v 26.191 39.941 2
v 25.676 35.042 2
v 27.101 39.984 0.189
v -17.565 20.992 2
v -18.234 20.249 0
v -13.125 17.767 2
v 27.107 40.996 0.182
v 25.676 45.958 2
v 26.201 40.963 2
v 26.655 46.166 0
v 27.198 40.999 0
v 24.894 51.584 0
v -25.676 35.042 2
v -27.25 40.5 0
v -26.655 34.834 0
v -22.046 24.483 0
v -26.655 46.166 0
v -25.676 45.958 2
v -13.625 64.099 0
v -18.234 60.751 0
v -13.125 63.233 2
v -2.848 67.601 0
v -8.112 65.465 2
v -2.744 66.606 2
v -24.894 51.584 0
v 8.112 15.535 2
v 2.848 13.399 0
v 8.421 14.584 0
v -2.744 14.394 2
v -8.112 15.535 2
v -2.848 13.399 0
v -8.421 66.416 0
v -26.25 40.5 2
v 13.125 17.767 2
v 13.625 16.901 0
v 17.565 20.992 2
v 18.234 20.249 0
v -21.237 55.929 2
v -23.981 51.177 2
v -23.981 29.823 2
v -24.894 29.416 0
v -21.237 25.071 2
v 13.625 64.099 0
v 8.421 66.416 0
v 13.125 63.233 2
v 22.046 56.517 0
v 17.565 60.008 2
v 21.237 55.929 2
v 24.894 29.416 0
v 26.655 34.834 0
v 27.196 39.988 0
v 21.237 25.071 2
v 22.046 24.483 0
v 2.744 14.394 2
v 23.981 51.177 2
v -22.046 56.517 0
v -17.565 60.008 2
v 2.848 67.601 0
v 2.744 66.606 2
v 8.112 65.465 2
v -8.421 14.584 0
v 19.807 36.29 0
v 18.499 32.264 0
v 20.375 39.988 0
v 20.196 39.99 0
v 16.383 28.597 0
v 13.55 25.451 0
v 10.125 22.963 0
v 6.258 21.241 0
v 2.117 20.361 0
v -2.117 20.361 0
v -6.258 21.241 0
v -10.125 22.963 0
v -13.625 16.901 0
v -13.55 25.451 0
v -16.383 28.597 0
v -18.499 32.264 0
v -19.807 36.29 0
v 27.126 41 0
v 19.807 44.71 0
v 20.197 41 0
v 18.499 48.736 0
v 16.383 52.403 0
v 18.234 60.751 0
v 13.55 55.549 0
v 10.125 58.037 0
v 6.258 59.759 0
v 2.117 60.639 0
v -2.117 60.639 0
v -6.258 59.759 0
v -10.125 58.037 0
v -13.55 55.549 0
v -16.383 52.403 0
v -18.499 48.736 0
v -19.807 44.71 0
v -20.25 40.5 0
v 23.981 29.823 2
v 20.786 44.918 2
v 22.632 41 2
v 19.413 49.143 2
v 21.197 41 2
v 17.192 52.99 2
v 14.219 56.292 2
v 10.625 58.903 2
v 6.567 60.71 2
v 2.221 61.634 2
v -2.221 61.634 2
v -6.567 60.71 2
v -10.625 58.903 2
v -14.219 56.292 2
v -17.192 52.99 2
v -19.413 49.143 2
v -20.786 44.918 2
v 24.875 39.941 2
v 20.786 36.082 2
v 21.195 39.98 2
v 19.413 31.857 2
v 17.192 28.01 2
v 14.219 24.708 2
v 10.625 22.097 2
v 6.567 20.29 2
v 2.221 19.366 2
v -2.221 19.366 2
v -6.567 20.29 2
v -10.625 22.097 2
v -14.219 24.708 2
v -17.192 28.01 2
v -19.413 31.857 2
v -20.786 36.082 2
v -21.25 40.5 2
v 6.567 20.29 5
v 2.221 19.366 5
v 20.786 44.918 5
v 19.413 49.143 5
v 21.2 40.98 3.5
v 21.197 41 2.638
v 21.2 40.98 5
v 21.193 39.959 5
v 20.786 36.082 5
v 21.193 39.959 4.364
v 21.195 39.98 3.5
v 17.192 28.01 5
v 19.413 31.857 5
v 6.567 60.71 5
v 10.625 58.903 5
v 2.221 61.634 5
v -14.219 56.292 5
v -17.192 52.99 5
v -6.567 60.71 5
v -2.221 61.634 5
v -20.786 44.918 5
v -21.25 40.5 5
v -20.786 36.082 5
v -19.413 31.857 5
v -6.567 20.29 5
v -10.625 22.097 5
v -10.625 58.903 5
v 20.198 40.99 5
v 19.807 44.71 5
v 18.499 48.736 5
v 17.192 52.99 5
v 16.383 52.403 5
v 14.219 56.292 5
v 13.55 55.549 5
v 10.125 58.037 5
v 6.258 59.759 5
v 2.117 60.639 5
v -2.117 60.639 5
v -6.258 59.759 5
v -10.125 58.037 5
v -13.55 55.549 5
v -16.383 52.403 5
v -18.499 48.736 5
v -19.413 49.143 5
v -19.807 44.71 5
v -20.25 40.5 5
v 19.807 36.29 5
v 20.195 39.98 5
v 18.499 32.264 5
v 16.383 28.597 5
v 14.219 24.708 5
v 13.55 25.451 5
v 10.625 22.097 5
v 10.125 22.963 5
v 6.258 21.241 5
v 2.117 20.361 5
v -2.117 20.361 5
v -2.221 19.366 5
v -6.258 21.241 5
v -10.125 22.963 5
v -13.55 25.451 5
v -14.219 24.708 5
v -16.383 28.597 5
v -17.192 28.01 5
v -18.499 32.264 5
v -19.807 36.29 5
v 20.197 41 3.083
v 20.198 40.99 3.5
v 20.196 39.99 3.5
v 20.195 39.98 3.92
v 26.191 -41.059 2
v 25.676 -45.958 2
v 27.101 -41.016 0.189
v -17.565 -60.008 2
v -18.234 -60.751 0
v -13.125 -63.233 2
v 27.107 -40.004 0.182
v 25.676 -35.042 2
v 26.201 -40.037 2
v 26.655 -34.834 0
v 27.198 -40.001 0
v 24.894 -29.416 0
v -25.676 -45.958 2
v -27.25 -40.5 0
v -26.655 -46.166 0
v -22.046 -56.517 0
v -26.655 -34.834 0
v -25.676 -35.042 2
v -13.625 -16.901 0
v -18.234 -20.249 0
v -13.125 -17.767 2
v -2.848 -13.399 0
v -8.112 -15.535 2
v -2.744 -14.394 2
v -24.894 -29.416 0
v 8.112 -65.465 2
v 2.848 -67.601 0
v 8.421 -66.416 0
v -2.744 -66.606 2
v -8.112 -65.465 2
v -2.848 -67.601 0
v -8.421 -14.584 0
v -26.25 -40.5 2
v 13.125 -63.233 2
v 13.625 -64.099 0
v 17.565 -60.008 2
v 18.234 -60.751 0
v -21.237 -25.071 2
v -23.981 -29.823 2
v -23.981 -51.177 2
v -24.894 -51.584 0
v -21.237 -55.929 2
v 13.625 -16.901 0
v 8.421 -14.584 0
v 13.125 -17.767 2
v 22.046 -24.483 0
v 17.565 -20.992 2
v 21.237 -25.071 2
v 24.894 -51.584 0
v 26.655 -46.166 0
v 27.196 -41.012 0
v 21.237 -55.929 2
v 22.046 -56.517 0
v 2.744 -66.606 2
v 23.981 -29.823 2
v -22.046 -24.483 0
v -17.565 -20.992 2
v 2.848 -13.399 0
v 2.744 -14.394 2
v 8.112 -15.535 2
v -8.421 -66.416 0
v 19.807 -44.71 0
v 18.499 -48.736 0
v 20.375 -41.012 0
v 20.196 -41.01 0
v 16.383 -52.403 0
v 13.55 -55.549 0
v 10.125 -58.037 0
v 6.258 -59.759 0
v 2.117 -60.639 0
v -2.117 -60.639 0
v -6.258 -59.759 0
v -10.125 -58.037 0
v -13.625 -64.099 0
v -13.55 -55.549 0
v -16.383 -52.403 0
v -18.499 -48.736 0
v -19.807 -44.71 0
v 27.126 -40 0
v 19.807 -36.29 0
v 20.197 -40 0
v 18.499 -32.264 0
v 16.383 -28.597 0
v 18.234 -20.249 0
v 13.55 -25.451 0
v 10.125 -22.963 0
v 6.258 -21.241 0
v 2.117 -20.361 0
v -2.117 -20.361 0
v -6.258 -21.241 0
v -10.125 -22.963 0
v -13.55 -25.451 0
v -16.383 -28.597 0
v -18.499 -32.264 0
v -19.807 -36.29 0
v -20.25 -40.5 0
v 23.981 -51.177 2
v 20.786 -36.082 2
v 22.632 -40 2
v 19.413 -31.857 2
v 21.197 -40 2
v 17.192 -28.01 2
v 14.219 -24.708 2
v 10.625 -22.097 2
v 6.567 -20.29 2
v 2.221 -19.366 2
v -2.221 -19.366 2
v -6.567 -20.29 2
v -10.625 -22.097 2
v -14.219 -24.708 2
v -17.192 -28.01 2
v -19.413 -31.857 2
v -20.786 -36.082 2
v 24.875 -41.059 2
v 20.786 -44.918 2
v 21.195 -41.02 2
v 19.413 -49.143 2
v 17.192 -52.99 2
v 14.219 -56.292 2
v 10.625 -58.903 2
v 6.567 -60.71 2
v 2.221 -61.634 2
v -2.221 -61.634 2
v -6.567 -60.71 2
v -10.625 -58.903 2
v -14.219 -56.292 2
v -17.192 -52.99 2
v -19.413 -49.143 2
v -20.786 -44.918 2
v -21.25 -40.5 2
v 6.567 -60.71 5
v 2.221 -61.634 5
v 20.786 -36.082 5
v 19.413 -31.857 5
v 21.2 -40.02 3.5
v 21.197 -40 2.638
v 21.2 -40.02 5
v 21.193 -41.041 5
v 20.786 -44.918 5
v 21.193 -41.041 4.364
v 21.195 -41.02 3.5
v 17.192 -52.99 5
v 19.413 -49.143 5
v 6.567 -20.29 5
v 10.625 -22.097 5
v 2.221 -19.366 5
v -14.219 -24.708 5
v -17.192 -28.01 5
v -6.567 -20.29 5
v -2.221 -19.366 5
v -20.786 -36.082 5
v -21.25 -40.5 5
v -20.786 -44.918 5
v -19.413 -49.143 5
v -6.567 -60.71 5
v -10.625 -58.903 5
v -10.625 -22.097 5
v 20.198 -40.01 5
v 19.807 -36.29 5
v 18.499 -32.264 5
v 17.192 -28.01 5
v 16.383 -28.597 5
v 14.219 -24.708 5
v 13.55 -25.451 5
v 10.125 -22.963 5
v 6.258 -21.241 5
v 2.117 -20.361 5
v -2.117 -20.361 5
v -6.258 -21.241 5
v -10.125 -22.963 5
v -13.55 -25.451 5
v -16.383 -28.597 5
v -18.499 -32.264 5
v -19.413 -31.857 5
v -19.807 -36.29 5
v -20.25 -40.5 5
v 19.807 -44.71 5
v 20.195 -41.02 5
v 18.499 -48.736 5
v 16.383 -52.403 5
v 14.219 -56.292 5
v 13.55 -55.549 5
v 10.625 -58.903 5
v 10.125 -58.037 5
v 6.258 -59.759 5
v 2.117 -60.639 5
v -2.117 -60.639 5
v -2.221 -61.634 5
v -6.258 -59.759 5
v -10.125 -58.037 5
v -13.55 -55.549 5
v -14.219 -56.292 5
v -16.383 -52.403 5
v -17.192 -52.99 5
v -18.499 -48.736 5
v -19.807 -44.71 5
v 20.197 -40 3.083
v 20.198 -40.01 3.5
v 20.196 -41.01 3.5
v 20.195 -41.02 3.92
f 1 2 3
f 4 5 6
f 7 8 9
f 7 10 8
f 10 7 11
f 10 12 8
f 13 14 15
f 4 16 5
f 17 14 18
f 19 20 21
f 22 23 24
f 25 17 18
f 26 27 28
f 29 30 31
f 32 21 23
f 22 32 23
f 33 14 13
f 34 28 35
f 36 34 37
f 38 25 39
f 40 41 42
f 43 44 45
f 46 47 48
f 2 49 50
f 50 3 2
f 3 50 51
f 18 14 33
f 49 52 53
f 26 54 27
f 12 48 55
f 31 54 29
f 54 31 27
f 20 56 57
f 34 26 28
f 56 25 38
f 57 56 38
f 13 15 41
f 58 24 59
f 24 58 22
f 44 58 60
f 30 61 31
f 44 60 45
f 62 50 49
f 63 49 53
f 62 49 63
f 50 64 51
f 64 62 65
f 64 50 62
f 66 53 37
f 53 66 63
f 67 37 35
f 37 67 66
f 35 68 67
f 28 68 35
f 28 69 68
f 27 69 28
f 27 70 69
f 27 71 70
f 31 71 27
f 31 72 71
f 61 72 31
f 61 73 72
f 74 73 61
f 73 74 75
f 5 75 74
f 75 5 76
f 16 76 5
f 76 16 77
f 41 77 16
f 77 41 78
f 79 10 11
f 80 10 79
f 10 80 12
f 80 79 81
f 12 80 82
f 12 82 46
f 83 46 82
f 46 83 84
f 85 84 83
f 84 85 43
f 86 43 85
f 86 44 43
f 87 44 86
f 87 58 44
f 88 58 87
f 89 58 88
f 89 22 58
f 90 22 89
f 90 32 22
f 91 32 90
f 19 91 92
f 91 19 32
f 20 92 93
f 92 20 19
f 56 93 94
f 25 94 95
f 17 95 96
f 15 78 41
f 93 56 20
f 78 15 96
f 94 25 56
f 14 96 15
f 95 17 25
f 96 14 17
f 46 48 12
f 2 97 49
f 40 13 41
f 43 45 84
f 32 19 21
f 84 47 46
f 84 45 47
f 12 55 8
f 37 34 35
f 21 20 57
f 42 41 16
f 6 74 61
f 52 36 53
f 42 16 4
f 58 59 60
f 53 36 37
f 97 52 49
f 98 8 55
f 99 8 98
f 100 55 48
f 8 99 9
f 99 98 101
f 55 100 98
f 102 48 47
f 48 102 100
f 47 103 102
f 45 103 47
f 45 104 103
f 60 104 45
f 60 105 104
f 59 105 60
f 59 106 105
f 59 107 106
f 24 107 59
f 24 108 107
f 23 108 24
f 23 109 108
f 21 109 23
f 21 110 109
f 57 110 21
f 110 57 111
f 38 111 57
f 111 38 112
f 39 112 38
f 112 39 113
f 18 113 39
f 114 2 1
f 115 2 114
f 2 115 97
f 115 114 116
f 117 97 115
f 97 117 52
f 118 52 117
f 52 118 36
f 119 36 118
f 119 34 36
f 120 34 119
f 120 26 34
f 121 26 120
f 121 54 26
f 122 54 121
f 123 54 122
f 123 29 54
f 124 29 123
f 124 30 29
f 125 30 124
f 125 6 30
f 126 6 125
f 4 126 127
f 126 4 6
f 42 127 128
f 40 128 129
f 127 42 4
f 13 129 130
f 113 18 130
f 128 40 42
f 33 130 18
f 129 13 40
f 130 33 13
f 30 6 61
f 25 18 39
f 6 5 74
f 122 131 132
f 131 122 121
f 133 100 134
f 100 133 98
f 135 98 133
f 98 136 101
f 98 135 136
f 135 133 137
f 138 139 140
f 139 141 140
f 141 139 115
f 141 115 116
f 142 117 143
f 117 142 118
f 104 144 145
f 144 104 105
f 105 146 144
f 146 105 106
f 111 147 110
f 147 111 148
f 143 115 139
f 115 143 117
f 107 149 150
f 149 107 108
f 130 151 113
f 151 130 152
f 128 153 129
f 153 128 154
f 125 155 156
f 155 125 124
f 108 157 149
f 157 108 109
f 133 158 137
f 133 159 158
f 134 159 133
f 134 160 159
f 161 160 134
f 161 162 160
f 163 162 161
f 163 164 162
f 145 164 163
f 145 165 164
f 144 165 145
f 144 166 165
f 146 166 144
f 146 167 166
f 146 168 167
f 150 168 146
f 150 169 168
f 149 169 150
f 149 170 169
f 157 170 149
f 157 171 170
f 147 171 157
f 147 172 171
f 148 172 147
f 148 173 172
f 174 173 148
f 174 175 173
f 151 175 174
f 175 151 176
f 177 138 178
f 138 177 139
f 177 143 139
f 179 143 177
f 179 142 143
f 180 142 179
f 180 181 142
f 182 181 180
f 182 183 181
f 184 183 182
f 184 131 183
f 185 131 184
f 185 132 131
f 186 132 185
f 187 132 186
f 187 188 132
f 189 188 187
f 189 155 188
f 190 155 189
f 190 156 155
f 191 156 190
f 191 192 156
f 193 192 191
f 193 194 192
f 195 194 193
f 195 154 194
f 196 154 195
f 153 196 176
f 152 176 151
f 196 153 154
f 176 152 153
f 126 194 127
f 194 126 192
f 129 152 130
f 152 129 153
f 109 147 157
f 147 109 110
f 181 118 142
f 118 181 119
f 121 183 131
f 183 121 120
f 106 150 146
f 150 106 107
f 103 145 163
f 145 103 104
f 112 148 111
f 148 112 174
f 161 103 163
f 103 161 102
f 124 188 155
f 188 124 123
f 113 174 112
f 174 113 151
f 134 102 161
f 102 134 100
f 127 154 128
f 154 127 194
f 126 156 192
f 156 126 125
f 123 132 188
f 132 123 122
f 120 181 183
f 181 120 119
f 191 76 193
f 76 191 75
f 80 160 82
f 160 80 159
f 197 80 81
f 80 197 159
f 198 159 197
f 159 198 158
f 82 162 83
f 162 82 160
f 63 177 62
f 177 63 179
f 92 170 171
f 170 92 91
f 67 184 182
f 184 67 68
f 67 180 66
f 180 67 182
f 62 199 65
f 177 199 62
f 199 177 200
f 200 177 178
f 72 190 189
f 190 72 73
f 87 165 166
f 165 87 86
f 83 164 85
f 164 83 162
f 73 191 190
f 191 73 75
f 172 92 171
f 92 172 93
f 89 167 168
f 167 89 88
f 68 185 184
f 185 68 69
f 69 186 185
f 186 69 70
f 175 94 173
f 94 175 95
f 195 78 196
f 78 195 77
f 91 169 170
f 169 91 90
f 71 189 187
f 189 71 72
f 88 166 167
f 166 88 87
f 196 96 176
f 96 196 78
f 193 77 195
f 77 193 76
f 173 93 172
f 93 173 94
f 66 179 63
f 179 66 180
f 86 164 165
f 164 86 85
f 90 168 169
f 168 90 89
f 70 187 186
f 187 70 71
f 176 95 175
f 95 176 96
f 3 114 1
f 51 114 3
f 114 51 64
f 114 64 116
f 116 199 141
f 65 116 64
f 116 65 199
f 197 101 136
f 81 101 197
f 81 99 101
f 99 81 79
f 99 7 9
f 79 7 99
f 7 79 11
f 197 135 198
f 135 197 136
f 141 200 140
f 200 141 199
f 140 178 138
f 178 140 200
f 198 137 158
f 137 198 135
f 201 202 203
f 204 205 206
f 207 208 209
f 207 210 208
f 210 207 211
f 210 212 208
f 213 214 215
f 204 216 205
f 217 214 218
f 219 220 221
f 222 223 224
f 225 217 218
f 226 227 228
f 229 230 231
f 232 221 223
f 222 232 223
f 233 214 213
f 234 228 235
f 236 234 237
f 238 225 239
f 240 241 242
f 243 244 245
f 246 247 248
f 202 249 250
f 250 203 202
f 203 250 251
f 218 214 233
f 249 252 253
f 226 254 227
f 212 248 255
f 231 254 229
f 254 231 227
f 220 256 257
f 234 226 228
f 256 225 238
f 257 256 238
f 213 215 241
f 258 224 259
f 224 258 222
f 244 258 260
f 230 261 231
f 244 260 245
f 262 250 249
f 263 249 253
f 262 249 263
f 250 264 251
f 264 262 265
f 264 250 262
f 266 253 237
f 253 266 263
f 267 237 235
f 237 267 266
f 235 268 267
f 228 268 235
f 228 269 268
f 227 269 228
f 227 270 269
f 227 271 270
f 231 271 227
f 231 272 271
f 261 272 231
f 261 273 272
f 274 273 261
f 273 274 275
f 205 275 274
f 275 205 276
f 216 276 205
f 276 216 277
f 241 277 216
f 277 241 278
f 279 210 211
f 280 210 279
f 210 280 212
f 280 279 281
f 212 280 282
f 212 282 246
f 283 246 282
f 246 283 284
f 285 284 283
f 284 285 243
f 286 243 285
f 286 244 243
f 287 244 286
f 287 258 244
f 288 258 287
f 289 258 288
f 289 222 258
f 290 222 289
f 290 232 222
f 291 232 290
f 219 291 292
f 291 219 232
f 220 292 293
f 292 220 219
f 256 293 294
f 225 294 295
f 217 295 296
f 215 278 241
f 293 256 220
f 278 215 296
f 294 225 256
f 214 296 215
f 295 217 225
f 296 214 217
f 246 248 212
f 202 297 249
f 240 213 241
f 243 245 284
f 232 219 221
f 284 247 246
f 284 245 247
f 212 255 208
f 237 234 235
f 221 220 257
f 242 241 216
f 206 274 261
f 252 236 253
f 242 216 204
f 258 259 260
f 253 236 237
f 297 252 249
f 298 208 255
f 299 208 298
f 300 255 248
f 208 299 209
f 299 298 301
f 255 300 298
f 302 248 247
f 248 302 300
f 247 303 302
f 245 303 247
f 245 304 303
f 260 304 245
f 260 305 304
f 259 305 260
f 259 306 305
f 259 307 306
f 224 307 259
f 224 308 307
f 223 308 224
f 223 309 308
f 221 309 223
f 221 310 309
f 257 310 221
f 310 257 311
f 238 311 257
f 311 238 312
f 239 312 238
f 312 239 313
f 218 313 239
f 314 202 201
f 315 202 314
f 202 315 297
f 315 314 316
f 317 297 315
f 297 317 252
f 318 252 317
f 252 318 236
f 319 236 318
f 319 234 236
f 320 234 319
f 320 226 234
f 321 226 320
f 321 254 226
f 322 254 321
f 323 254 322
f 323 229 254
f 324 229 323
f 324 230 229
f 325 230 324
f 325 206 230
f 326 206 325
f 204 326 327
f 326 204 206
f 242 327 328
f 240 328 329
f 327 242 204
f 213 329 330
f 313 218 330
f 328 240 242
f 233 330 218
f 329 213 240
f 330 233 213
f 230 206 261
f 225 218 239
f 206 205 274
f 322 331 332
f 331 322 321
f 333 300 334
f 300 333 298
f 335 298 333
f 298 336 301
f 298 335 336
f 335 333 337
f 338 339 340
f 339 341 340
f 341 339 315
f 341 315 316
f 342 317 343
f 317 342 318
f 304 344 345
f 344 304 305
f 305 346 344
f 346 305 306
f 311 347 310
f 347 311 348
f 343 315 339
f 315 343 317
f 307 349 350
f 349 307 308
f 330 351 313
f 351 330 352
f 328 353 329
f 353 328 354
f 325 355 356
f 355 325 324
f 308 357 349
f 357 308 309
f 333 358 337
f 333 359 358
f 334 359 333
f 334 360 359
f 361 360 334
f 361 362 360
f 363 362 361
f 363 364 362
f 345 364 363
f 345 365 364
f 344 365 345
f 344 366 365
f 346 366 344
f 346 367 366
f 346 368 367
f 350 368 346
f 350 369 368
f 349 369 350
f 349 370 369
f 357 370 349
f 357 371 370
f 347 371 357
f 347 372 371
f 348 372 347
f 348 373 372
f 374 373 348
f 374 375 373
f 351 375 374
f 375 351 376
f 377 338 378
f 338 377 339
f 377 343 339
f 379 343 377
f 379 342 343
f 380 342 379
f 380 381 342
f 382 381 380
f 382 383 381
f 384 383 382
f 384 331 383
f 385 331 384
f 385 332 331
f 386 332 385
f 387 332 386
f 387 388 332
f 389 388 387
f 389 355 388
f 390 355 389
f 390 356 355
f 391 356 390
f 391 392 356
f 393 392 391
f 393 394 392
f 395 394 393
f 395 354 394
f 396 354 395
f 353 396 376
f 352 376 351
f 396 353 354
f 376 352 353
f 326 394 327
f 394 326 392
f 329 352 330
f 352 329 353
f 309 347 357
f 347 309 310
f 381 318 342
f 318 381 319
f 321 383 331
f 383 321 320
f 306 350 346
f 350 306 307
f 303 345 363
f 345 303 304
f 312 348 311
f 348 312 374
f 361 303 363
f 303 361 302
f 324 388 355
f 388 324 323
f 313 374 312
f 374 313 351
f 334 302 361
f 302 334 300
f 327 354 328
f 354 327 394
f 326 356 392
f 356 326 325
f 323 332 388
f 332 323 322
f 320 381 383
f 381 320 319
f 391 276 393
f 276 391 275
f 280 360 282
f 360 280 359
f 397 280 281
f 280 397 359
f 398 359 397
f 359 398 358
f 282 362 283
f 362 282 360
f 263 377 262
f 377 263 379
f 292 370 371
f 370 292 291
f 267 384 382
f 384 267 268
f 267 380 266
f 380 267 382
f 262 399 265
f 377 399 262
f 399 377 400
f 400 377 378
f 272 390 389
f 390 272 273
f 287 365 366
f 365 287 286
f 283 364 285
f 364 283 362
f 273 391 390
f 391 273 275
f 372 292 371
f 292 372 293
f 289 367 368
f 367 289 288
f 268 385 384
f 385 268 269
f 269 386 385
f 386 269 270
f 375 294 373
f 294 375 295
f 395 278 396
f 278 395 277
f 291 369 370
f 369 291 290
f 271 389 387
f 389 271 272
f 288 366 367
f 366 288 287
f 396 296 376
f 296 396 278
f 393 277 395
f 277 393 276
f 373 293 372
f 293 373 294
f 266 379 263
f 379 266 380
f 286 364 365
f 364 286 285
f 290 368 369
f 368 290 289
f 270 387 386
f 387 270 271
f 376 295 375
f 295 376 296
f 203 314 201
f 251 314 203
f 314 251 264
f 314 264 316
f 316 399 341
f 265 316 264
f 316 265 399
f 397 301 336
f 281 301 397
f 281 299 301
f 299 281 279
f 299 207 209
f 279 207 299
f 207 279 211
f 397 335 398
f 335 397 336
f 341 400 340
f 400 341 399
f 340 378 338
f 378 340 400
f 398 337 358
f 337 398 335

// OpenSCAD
/* Copyright © 2016. Alexander Golikov.
 * 
 * This file is free software: you can redistribute it and/or modify it under the terms of the Creative Commons Attribution-NonCommercial-ShareAlike International Public License, either version 4.0 of the License, or (at your option) any later version.
 * 
 * This file is distributed in the hope that it will be useful, but WITHOUT ANY WARRANTY; without even the implied warranty of MERCHANTABILITY or FITNESS FOR A PARTICULAR PURPOSE. See the Creative Commons Attribution-NonCommercial-ShareAlike International Public License for more details.
 * 
 * You should have received a copy of the Creative Commons Attribution-NonCommercial-ShareAlike International Public License along with this file.
 * 
 * If not, see https://creativecommons.org/licenses/by-nc-sa/4.0/legalcode.
 */

// Diameter of rolling pin.
diameter = 40.5; 		// [30:0.5:70]
// Thickness of the rolled dough.
width = 7; 				// [1:1:10]
// Height of the extender.
height = 5; 			// [2:1:10]
// Number of the extenders
number = 2; 			// [1:One, 2:Two, 4:Four]
// Sharp facet. NOTE! Depends on opportunities of Your printer
facet = 1; 			// [1:On, 0:Off]
// Dual sharp facet, if "Sarp facet" is on.
second_facet = 0; 	// [1:On, 0:Off]
// Thickness of "Sarp facet". NOTE! May be NOT MORE then Height/2!
thickness = 1; 			// [1:0.5:5]

/* [Hidden] */

//$fn=64;
d=diameter;
w=width;
h=height;
th=thickness;

r1=(d/2+w);
r2=(d/2+(w-1));

if (th > (h/2)) {
	th = round(h/2);
}

if(number==4) {
	guide(d,d);
	guide(d,-d);
	guide(-d,d);
	guide(-d,-d);
} else if(number==2) {
	guide(0,d);
	guide(0,-d);
} else {
	guide(0,0);
}

module guide(x,y) {
	translate([x,y,0]){
		difference(){
			union(){
				color("green")
					if(facet==1){
						if(second_facet==1){
							union(){
								cylinder(h=th,r1=r2,r2=r1,center=false);
								translate([0,0,th]){
									cylinder(h=th,r1=r1,r2=r2,center=false);
								}
							}
						} else {
							cylinder(h=2*th,r1=r1,r2=r2,center=false);
						}
					} else {
						cylinder(h=h,r=r1,center=false);
					}
				color("red")
					cylinder(h=h,d=(d+(2*th)),center=false);
			}
			color("yellow")
				translate([0,0,-(th/2)])
					cylinder(h=h+th,d=d,center=false);
			color("blue")
				translate([((d/2)-th),-(th/2),-(th/2)])
					linear_extrude(h=(h+th), slices=(5*h), twist=(3*h))
						square([(w+(2*th)),(th)],false);
		}
	}
}
